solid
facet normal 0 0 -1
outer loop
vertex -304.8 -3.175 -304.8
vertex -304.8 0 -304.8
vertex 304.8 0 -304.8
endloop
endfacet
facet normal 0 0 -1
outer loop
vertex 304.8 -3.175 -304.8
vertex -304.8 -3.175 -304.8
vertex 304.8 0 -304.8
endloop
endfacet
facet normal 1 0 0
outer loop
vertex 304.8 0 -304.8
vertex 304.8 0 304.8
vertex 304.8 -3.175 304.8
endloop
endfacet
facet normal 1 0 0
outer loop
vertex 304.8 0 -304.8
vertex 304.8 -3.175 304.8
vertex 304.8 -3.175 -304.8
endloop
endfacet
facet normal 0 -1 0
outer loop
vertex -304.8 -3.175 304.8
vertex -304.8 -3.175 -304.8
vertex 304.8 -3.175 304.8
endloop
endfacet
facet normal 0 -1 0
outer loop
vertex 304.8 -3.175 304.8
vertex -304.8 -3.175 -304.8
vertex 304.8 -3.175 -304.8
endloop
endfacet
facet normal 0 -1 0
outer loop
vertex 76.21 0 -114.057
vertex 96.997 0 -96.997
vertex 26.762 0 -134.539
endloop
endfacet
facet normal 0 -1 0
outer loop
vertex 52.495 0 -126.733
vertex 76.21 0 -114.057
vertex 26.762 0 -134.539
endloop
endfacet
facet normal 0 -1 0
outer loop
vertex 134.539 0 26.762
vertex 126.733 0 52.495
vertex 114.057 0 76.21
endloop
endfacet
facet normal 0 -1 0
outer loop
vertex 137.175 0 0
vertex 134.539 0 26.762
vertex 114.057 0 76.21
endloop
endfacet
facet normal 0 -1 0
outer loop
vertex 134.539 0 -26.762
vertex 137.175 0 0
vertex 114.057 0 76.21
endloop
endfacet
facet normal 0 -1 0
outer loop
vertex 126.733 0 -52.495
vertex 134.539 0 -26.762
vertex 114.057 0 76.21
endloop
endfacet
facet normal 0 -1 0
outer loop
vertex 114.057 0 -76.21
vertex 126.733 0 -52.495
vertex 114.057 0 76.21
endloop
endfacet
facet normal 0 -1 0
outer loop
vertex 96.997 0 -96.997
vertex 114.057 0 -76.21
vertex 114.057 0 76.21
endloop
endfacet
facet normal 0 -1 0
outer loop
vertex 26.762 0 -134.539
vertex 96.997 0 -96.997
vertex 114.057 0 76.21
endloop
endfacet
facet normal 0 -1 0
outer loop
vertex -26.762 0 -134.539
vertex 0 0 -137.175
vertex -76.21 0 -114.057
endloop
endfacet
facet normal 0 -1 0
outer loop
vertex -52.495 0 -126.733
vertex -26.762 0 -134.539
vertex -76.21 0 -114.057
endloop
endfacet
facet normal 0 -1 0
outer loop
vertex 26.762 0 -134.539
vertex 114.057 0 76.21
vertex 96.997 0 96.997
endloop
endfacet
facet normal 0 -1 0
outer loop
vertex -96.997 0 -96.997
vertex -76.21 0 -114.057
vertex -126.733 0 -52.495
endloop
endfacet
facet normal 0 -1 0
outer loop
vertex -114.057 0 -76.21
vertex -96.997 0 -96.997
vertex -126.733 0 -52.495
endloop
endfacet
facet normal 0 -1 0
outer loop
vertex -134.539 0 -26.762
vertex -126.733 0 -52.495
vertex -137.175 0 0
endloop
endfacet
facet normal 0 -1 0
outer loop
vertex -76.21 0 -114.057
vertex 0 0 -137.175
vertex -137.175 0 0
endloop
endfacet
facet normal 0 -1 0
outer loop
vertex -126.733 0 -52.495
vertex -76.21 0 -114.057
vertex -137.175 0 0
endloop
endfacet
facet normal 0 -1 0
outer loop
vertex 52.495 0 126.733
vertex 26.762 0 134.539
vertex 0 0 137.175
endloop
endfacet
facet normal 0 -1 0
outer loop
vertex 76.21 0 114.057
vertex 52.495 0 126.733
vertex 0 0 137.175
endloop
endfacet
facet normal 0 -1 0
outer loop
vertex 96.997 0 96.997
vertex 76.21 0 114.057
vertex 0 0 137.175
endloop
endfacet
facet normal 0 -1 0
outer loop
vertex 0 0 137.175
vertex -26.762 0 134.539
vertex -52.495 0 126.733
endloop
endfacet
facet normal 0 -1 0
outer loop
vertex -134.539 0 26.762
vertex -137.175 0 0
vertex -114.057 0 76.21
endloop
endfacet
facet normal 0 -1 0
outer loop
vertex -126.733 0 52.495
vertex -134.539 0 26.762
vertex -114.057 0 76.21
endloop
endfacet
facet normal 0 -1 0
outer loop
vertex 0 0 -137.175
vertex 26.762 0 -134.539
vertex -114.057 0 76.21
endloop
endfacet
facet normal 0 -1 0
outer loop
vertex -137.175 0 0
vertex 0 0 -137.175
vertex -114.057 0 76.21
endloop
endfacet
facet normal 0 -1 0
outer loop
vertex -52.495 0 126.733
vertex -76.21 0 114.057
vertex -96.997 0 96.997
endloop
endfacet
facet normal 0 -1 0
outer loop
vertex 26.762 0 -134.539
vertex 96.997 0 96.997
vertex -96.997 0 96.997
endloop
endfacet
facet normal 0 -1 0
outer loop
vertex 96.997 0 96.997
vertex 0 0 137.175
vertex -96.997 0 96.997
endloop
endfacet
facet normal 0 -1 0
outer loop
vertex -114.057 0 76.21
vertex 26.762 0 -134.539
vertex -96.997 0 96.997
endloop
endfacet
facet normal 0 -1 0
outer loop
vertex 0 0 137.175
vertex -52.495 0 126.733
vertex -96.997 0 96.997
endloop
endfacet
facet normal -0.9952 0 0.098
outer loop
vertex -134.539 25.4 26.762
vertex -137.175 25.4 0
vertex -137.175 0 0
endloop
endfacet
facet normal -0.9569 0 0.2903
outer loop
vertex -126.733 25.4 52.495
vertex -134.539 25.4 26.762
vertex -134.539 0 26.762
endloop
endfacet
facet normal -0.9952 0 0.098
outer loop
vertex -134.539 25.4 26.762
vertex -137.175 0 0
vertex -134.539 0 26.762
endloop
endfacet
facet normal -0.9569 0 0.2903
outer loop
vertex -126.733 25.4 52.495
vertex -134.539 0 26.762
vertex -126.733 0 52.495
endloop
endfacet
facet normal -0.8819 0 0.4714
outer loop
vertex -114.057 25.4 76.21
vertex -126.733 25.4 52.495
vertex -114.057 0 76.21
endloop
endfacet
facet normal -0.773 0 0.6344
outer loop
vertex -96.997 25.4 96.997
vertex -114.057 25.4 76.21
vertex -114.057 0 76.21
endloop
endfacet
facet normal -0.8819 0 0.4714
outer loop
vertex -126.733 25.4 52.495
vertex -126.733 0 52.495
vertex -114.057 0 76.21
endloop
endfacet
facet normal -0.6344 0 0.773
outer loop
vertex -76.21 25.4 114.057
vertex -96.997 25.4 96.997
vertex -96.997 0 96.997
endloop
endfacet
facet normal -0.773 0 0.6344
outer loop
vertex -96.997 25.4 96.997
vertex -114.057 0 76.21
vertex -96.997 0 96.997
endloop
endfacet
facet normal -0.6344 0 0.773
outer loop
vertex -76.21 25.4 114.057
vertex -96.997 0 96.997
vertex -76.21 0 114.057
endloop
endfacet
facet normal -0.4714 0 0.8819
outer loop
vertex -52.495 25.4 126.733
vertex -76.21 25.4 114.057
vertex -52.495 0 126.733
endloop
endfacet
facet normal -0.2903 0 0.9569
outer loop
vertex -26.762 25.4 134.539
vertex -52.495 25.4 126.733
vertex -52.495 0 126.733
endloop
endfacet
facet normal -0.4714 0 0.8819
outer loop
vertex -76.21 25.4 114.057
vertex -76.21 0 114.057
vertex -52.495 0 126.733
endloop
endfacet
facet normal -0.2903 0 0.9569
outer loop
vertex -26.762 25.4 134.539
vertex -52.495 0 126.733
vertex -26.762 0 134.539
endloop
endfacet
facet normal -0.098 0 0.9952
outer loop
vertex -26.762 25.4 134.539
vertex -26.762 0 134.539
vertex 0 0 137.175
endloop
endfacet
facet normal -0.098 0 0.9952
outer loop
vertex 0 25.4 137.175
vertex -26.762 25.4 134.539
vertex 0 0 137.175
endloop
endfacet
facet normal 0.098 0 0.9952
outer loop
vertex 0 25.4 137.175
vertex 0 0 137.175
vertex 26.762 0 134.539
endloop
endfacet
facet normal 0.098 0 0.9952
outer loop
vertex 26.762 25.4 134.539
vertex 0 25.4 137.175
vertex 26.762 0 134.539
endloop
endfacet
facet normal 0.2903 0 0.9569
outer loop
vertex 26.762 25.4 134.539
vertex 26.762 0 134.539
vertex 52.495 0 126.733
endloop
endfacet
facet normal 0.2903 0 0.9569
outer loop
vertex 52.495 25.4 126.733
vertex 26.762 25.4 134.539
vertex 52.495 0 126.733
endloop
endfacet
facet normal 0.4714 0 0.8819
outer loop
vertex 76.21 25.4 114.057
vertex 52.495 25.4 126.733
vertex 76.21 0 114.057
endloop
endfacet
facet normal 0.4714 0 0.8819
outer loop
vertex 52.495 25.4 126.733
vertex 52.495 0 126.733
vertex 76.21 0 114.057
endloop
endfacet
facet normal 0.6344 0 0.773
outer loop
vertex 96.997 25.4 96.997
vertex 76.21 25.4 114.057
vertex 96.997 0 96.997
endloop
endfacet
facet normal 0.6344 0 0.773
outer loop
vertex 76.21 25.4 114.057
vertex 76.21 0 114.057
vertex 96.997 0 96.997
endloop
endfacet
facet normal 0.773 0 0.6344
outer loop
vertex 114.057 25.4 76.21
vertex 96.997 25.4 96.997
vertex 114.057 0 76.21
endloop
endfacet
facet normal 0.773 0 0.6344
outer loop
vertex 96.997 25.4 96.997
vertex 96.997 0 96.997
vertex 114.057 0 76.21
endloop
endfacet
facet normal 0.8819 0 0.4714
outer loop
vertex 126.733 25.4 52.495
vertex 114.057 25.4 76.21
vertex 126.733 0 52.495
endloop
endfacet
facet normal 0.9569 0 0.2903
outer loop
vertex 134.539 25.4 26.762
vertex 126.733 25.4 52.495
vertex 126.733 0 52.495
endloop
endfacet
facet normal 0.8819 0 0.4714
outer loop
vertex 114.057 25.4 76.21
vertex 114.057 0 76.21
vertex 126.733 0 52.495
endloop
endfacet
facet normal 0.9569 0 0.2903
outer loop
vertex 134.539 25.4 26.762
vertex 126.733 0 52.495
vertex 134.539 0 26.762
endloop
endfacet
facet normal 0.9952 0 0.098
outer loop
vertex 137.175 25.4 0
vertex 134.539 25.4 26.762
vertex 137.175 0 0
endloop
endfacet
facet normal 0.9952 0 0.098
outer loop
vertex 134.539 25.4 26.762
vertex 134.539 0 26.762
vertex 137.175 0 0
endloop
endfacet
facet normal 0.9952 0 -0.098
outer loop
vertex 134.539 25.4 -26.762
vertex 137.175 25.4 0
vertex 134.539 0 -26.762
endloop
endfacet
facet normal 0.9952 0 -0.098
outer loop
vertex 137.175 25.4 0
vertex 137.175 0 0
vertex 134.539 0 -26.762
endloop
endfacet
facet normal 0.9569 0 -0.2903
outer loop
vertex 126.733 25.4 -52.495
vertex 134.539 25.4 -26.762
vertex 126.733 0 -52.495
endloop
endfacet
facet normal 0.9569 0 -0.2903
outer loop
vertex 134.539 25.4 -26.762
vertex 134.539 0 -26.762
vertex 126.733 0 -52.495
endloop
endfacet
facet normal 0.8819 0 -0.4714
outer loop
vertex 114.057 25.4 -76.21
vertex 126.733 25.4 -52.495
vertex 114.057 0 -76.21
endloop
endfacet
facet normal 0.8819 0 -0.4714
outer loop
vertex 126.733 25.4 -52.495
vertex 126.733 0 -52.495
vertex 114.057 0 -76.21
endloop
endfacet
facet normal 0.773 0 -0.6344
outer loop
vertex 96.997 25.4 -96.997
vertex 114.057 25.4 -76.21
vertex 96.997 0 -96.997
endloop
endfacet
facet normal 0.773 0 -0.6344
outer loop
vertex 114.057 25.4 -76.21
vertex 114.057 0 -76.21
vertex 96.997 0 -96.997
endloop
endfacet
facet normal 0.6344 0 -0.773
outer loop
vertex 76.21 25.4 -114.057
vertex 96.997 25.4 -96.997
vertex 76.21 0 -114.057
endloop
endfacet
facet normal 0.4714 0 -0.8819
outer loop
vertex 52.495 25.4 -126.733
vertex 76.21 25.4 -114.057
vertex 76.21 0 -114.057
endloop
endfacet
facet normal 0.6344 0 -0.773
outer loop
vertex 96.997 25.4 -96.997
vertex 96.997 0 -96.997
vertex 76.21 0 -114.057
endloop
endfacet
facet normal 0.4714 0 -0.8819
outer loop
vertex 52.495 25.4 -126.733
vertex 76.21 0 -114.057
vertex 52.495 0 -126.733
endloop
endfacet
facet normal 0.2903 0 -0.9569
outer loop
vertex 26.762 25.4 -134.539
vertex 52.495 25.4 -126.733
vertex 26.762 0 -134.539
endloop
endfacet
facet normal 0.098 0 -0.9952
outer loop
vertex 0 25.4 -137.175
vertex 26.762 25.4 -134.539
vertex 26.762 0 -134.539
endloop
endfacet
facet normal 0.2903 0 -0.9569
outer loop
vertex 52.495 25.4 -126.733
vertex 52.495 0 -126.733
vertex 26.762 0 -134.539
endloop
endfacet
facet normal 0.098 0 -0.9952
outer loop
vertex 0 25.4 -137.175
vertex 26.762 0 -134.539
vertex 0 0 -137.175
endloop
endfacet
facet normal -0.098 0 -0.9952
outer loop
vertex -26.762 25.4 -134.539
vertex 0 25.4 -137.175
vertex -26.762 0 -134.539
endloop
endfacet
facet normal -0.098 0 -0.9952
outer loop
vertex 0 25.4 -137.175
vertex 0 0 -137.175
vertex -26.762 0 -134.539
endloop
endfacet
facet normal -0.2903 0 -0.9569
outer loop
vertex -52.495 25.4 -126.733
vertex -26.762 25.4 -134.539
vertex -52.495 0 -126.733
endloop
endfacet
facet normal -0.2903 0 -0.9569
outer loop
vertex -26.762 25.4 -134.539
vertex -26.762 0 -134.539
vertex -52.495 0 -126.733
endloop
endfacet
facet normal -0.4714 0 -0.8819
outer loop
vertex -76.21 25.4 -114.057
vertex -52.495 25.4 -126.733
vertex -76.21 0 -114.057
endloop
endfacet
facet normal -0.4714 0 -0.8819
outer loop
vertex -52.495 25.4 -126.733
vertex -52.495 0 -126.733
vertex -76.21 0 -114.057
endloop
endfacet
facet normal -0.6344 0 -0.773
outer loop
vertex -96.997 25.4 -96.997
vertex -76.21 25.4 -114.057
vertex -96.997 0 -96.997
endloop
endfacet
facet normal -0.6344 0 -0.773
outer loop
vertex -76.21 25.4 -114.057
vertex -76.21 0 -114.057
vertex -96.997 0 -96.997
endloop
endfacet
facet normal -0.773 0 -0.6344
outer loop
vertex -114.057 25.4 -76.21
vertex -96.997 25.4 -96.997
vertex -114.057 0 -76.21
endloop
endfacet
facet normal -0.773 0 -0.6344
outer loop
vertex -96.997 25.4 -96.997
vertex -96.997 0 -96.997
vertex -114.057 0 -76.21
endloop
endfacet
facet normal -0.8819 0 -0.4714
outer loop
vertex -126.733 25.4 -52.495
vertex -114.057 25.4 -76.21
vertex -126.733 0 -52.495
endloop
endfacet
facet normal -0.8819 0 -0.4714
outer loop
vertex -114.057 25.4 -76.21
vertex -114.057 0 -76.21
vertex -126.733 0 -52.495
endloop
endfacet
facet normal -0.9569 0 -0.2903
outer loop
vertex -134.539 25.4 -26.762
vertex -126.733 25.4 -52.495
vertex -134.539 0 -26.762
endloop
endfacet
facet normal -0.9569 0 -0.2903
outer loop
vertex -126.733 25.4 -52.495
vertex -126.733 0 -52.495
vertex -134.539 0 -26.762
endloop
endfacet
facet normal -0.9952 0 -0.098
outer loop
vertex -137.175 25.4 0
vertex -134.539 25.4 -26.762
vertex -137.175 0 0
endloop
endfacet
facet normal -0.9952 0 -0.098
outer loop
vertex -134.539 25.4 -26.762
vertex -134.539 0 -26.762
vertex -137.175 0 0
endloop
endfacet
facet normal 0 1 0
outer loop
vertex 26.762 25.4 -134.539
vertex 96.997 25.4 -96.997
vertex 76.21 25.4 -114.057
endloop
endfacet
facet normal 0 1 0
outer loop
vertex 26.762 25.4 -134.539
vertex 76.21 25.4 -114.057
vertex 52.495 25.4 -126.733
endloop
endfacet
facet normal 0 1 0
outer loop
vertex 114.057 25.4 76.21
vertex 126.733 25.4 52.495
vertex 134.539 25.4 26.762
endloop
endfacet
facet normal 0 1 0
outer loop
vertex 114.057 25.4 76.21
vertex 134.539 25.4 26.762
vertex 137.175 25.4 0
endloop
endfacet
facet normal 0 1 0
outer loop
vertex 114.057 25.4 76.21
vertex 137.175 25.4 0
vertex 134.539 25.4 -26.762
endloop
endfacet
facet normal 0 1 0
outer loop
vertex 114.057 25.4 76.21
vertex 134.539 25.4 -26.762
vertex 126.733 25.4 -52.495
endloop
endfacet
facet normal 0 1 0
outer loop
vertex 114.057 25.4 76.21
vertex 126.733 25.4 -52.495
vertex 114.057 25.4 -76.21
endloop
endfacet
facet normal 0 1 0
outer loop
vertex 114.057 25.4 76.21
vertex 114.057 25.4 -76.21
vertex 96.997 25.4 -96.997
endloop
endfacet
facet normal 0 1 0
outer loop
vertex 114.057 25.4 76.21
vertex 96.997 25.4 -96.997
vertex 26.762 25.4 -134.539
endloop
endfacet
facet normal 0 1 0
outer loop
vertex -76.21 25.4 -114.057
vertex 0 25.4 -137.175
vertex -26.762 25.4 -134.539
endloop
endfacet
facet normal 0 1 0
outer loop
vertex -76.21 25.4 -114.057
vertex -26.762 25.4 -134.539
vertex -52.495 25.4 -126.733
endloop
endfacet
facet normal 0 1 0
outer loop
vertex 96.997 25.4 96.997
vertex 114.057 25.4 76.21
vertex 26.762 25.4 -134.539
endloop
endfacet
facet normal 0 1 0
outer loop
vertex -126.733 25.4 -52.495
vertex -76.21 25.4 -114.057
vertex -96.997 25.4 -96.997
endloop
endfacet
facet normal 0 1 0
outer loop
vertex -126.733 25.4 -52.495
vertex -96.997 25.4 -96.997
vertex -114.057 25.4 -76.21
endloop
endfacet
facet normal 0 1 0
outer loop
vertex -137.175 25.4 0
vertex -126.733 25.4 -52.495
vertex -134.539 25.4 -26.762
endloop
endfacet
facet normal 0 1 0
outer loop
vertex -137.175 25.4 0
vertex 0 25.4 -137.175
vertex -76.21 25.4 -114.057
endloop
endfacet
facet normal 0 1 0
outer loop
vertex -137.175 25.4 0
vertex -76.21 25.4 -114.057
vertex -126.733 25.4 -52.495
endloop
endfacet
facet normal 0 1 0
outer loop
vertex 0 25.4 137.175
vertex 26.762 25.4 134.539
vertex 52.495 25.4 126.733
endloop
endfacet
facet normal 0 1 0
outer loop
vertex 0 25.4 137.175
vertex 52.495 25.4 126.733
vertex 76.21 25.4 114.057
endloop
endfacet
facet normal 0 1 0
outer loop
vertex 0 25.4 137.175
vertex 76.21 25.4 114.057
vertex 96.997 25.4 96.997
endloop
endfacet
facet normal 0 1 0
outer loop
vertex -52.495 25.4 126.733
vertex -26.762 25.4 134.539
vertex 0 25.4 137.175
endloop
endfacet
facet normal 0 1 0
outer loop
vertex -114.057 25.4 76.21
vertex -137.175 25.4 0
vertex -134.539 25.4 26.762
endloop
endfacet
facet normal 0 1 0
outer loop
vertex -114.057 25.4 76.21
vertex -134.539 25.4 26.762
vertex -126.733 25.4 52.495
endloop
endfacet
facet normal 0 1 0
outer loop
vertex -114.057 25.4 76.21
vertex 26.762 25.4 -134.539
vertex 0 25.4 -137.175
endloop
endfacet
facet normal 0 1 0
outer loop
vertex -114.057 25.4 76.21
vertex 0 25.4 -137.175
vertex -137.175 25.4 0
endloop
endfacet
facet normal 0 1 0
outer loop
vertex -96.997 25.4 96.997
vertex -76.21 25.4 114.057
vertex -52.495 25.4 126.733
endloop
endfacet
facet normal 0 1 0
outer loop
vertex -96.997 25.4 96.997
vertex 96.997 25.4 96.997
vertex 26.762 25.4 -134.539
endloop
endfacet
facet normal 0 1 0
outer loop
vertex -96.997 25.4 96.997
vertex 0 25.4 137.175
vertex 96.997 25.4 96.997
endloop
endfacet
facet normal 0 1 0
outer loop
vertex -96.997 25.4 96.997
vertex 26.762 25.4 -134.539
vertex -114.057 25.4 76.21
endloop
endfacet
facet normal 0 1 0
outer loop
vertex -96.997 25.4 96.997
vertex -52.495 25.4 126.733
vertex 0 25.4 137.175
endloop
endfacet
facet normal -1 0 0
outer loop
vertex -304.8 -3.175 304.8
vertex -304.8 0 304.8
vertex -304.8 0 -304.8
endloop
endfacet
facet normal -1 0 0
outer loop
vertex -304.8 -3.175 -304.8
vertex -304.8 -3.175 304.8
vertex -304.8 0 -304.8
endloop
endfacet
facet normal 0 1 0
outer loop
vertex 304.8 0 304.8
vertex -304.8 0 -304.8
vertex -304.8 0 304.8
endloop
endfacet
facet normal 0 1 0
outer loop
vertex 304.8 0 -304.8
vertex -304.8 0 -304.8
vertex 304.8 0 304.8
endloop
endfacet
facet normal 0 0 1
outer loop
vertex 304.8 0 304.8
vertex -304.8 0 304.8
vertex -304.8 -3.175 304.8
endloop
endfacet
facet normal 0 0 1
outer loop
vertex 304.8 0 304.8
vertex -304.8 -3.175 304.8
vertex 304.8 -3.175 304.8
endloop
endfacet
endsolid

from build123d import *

# Parameters (mm, degrees)
SKETCH1_W      = 609.6
SKETCH1_H      = 609.6
EXTRUDE1_DEPTH = 3.175
SKETCH3_R      = 137.175010905
EXTRUDE2_DEPTH = 25.4


with BuildPart() as part:
    # Sketch1 → Extrude1 (new body)
    with BuildSketch(Plane(origin=(0, 0, 0), x_dir=(1, 0, 0), z_dir=(0, 1, 0))):
        Rectangle(SKETCH1_W, SKETCH1_H)
    extrude(amount=-EXTRUDE1_DEPTH)


with BuildPart() as body_2:
    # sketch3 → Extrude2 (new body)
    with BuildSketch(Plane(origin=(0, 0, 0), x_dir=(-1, 0, 0), z_dir=(0, 1, 0))):
        Circle(SKETCH3_R)
    extrude(amount=EXTRUDE2_DEPTH)


solid = Compound([part.part, body_2.part])
